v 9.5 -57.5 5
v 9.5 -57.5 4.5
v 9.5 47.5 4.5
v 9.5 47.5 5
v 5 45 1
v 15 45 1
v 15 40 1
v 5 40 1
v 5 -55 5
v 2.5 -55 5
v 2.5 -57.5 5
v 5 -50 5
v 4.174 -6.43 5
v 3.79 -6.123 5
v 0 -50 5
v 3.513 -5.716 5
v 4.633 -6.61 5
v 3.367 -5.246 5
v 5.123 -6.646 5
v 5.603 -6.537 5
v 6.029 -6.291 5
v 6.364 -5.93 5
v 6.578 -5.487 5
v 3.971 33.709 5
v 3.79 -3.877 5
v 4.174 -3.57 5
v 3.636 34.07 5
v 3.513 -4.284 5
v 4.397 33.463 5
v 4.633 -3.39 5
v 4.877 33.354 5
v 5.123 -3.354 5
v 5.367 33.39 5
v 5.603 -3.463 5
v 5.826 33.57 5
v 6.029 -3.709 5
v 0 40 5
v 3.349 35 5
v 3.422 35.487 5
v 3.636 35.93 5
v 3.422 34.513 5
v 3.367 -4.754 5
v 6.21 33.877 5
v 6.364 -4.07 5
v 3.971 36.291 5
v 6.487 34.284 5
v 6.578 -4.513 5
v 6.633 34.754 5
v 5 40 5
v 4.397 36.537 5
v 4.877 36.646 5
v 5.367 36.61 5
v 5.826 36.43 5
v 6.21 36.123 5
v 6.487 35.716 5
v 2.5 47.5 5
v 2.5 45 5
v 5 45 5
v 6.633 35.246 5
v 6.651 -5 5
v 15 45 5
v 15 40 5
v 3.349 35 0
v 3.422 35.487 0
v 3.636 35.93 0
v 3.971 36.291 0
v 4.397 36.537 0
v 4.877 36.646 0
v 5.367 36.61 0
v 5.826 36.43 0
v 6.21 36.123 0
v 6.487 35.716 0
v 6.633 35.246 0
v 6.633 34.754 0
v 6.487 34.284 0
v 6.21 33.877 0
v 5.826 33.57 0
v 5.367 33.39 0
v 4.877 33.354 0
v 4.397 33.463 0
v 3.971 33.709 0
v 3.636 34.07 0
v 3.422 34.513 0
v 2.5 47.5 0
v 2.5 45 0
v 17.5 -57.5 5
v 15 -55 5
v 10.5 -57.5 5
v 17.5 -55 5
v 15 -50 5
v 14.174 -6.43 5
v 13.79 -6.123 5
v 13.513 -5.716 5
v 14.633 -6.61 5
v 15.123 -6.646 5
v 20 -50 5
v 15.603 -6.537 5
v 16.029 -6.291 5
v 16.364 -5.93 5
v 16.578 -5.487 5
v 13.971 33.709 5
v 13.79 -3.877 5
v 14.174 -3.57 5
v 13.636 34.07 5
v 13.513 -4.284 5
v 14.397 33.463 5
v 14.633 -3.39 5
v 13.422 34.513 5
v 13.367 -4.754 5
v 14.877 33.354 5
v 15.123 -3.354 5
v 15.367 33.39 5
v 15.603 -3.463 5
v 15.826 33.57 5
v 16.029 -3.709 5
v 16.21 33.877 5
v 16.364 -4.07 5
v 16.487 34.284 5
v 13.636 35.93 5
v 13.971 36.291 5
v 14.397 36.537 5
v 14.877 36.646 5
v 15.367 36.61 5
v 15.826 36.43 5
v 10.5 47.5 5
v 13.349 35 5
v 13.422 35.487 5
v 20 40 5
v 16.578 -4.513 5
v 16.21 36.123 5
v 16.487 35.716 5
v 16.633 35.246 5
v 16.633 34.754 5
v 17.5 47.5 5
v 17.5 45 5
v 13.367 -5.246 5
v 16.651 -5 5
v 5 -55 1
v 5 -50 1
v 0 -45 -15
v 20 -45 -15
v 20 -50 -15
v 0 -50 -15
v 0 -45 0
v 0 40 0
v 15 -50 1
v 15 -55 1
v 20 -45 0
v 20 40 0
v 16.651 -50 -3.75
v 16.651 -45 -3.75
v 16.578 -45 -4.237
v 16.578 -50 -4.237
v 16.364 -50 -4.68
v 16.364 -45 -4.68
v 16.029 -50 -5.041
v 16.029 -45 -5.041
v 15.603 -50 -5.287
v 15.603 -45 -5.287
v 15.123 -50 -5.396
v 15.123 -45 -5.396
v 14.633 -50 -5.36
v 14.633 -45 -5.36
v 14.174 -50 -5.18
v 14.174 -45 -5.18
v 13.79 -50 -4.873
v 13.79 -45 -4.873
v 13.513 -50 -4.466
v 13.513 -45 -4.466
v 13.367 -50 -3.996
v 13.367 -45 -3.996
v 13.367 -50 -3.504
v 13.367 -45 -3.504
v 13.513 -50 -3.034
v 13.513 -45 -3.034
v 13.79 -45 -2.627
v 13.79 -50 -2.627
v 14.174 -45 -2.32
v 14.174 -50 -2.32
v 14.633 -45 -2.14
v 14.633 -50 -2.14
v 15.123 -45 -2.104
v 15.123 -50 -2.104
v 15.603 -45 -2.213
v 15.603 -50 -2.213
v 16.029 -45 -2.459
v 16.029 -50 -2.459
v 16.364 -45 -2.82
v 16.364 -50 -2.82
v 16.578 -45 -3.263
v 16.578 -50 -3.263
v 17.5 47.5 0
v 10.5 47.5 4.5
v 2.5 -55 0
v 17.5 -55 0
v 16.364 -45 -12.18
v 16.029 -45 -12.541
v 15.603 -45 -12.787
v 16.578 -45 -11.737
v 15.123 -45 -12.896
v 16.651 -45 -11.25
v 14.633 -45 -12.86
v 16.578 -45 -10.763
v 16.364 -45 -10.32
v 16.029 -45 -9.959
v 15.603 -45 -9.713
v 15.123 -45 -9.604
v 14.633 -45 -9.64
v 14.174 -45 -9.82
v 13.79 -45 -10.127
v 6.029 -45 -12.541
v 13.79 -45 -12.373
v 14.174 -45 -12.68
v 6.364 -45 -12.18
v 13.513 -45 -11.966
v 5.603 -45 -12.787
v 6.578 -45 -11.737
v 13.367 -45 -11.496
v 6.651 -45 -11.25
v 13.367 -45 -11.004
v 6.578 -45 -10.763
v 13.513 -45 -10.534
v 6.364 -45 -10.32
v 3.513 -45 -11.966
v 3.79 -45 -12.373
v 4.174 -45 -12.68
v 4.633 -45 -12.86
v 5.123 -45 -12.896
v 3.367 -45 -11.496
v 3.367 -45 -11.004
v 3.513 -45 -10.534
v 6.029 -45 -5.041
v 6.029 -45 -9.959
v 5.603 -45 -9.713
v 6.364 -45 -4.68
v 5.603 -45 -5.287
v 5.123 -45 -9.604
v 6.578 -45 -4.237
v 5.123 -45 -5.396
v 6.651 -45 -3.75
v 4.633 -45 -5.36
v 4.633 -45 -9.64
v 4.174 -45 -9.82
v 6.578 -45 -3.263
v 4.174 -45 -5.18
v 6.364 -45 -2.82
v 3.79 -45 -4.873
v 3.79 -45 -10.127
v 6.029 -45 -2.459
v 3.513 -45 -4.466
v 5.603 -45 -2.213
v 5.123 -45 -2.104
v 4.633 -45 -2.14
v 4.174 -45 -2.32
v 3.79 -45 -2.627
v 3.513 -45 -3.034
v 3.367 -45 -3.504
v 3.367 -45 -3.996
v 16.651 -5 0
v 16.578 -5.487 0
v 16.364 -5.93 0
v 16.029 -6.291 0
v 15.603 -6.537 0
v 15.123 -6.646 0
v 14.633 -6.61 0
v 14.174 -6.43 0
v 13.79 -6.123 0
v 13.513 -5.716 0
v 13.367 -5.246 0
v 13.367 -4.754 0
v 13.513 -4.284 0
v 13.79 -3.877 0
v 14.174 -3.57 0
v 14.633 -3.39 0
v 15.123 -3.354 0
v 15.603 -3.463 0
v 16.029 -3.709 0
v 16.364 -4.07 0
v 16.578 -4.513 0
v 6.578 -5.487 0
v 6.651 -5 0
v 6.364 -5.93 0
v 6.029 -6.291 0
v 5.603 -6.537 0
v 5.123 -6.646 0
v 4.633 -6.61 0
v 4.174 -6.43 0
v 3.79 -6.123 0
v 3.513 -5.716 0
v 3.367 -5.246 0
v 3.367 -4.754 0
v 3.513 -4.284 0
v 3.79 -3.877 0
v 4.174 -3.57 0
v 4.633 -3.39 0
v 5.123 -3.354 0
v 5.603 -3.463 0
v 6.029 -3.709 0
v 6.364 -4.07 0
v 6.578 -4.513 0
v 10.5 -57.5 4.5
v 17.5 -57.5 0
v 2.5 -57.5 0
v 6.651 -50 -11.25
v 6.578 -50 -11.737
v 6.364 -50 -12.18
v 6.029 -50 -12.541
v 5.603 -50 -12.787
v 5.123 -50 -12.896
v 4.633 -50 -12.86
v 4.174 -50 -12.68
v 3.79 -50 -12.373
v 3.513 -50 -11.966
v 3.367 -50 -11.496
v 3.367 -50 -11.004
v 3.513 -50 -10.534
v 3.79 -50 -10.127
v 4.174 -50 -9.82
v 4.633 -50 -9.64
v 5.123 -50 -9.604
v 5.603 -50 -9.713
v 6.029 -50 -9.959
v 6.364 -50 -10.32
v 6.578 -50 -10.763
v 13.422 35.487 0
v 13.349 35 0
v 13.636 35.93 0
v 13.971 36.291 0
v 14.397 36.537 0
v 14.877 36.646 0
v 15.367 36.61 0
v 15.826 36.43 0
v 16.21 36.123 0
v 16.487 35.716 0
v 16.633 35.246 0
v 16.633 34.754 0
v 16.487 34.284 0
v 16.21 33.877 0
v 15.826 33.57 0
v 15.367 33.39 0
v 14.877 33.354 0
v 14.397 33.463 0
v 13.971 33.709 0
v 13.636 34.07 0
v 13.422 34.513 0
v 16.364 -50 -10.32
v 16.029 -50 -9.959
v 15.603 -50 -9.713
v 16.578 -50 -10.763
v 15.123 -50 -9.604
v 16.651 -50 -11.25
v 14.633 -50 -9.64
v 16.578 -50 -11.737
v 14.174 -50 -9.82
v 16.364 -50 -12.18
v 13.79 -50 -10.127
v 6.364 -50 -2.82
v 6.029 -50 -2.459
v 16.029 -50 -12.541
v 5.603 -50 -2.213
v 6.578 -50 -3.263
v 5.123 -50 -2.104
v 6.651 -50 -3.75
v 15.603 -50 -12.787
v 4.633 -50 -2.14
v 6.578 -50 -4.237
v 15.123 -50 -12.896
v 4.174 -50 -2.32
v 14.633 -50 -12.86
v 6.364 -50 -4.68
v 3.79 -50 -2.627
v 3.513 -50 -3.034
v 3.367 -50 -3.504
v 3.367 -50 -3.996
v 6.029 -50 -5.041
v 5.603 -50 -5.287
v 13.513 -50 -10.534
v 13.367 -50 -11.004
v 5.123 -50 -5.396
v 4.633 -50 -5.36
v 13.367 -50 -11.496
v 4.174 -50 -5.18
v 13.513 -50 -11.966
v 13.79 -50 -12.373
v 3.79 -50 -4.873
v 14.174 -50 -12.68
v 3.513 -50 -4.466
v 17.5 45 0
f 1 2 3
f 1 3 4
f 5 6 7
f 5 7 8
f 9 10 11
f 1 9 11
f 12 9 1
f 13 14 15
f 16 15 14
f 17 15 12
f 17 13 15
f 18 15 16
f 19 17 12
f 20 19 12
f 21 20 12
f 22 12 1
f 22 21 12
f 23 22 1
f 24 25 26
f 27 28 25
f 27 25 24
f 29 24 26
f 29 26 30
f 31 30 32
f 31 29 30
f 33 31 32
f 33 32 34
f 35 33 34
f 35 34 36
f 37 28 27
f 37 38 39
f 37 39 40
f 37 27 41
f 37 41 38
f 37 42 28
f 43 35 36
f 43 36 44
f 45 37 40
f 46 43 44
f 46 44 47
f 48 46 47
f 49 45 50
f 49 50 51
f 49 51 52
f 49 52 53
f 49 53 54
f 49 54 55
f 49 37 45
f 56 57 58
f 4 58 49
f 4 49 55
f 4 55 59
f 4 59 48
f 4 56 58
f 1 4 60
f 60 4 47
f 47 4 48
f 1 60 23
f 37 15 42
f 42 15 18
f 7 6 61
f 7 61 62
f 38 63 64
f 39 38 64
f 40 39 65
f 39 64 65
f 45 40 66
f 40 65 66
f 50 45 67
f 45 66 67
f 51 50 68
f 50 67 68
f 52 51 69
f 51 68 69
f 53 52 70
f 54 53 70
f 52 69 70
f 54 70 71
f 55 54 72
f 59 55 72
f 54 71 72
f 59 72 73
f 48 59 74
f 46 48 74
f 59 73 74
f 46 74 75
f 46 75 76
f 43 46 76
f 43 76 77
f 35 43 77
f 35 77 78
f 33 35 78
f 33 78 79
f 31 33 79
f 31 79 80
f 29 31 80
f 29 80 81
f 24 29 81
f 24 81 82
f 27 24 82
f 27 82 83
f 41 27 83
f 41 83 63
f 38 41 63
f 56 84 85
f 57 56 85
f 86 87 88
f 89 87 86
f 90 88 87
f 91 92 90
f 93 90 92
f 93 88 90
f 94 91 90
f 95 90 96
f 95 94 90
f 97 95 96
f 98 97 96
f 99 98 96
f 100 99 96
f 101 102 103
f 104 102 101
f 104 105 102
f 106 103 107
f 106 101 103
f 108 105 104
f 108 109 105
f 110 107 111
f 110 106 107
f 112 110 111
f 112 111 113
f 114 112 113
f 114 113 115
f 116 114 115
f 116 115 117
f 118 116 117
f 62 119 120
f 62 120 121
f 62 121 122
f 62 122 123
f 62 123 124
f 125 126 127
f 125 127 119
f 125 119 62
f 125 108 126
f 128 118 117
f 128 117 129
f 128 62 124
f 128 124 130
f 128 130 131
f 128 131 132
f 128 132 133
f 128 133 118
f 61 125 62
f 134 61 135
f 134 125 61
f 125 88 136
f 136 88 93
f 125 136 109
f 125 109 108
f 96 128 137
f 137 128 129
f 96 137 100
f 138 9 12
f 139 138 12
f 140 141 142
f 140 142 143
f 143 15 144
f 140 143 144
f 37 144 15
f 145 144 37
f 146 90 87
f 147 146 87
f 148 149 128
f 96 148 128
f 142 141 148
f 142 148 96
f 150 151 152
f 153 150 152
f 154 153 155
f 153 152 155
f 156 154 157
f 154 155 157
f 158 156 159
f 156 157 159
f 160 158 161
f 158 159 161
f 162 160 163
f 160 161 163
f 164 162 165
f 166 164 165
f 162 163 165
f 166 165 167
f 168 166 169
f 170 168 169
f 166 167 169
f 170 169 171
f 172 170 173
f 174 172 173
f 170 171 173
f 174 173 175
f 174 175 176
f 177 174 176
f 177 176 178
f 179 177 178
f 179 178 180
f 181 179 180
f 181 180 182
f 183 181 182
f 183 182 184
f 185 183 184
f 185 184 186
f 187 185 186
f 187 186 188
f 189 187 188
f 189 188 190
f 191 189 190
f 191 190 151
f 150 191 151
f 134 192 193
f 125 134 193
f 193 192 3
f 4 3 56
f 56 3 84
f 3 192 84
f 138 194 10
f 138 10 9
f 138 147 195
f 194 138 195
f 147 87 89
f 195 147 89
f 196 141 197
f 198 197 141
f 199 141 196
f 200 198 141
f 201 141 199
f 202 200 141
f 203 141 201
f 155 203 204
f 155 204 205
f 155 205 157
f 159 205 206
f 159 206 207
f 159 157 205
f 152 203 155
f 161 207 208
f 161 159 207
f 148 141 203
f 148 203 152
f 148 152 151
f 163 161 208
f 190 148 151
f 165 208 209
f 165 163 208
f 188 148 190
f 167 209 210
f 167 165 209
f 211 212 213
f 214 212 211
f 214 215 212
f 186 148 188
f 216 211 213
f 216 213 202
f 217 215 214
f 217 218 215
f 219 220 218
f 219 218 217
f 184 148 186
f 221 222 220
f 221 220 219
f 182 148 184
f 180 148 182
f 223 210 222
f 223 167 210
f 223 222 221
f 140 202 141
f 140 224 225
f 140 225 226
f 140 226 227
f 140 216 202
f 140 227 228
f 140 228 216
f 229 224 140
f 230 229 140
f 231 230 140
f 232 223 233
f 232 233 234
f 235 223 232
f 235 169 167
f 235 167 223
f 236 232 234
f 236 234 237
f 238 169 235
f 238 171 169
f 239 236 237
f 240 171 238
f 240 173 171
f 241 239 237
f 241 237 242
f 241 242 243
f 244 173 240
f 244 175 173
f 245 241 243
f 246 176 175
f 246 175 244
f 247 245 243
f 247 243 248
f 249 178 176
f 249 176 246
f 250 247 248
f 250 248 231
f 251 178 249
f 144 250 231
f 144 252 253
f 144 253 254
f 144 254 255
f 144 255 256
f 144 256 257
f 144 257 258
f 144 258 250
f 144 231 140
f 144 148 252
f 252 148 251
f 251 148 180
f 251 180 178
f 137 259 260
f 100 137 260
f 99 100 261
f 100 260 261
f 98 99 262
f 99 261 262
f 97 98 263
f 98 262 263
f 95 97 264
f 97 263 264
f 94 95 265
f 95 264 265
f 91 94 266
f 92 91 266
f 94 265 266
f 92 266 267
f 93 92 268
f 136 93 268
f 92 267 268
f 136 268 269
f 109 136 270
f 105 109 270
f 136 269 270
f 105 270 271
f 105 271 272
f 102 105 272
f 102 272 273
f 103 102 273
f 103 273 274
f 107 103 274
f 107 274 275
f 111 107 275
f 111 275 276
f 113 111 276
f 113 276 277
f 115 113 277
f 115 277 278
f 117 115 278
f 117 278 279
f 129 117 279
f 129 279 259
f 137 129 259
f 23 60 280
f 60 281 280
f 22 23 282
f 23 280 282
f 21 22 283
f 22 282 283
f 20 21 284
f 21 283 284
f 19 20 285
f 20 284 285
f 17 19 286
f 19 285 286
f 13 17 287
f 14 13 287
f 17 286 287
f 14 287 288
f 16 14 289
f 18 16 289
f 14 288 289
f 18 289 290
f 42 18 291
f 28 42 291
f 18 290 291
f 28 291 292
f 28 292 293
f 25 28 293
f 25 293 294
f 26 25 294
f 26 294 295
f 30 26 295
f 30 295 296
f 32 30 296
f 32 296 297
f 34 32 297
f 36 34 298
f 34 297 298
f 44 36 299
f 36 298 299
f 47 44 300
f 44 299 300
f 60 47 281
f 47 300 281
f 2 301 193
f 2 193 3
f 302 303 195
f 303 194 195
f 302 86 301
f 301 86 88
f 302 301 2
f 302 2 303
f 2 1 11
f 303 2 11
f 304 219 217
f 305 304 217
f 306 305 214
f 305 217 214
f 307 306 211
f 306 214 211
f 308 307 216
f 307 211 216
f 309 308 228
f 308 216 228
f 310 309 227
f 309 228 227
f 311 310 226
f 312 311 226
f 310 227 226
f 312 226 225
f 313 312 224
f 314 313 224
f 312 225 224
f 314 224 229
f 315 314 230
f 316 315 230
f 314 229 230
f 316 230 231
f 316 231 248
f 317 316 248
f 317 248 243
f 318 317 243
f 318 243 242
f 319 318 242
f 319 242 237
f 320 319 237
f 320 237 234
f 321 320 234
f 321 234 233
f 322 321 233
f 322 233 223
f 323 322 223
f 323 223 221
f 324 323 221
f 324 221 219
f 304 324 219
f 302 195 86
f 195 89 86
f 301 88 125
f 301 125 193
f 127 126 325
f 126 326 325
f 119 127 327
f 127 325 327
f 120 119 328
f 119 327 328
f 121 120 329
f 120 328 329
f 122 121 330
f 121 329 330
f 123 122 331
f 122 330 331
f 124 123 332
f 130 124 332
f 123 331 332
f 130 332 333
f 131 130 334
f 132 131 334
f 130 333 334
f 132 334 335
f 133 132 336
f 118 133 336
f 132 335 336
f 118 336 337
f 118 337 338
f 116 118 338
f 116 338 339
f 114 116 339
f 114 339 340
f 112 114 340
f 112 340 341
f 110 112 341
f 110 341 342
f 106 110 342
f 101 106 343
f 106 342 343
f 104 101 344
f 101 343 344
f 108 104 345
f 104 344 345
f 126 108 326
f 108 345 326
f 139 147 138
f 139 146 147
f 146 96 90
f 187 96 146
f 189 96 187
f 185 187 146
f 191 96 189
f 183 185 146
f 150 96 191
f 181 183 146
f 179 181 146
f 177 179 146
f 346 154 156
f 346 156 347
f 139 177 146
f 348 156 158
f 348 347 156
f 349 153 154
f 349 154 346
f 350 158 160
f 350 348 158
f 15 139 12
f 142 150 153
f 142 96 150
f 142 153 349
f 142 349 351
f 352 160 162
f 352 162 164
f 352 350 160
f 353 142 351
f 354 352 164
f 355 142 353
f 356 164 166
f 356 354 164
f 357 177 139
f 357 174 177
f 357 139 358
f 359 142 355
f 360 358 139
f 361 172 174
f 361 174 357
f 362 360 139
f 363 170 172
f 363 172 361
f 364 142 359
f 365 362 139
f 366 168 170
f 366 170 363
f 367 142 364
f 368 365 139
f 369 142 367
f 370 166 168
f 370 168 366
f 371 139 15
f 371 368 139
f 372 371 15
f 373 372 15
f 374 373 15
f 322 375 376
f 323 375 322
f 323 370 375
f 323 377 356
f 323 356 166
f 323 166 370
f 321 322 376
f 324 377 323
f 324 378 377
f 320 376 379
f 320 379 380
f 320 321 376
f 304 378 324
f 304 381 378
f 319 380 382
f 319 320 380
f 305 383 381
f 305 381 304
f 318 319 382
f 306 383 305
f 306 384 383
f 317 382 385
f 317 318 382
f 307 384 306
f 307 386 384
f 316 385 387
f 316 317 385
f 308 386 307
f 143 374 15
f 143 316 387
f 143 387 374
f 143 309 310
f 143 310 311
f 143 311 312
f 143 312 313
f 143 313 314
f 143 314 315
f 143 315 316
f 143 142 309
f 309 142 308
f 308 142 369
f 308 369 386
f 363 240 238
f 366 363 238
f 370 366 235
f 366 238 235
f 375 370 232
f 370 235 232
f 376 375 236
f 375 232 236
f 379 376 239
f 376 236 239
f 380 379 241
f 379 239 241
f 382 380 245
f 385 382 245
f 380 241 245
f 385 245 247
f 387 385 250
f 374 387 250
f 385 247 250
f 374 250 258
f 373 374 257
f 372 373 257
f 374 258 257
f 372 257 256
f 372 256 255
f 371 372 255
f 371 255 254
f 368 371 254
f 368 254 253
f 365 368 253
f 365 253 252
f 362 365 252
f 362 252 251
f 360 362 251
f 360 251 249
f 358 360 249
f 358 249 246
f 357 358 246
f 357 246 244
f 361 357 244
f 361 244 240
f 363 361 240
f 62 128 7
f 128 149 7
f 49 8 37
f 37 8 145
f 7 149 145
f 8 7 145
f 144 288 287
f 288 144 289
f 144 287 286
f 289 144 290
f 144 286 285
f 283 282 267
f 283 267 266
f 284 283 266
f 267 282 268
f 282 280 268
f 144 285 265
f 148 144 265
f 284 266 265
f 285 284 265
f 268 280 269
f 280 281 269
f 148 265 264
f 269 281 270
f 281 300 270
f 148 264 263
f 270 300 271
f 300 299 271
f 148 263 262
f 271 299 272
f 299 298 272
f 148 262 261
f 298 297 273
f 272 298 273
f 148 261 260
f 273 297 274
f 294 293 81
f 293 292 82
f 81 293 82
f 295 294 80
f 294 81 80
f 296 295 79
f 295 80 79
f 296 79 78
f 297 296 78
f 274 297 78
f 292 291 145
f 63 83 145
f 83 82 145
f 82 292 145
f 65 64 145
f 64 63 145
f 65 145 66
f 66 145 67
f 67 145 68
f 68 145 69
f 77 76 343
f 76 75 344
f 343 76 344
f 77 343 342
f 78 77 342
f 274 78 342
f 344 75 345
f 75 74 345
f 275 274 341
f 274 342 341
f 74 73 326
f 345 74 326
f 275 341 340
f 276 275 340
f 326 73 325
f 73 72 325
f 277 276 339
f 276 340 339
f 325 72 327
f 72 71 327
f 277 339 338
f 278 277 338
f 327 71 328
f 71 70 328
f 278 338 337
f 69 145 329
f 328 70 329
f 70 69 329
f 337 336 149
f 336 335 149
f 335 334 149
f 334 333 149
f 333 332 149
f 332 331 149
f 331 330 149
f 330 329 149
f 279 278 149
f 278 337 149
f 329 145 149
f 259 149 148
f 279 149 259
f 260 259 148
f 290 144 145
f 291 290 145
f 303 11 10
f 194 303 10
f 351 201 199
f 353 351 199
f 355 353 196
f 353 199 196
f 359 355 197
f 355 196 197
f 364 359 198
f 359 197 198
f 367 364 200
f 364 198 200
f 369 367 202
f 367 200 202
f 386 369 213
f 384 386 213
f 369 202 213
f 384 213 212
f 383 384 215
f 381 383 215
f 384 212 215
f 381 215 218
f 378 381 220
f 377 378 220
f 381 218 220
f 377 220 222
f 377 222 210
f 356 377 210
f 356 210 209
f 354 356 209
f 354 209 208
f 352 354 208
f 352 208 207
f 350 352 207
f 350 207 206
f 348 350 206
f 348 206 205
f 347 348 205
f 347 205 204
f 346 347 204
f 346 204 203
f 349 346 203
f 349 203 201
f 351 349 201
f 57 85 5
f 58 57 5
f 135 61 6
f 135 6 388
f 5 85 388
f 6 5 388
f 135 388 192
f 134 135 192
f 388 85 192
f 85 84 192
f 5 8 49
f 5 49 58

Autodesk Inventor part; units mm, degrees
ref_plane "YZ Plane" through (0, 0, 0) normal (1, 0, 0) x (0, 1, 0)
ref_plane "XZ Plane" through (0, 0, 0) normal (0, 1, 0) x (-1, 0, 0)
ref_plane "XY Plane" through (0, 0, 0) normal (0, 0, 1) x (1, 0, 0)
sketch "Sketch1" plane through (0, 0, 0) normal (0, 0, 1) x (1, 0, 0)
  line L0 (0, 0) -> (20, 0)
  line L1 (20, 0) -> (20, -2.7984)
  line L2 (0, -2.7984) -> (0, 0)
  line L3 (0, 0) -> (20, 0)
  line L4 (20, 0) -> (20, -50)
  line L5 (20, -50) -> (0, -50)
  line L6 (0, -50) -> (0, 0)
  line L7 (0, 0) -> (5, 0)
  line L8 (0, -5) -> (0, 0)
  circle A0 centre (5, -5) radius 1.651
  line L9 (20, 0) -> (15, 0)
  line L10 (15, -5) -> (20, -5)
  line L11 (20, -5) -> (20, 0)
  circle A1 centre (15, -5) radius 1.651
  dimension "d1" = 20
  dimension "d2" = 50
  dimension "d6" = 5
  dimension "d7" = 5
  dimension "d9" = 3.302
extrude "Extrusion1" add sketch "Sketch1" along normal blind 5
sketch "Sketch2" plane through (0, 0, 5) normal (0, 0, 1) x (1, 0, 0)
  line L0 (20, 0) -> (0, 0) projected
  line L1 (10, 0) -> (5, 0)
  line L2 (5, 0) -> (5, 5)
  line L3 (5, 5) -> (10, 5)
  line L4 (10, 5) -> (10, 0)
  line L5 (10, 5) -> (2.5, 5)
  line L6 (2.5, 5) -> (2.5, 7.5)
  line L7 (2.5, 7.5) -> (10, 7.5)
  line L8 (10, 7.5) -> (10, 5)
  line L9 (2.5, 7.5) -> (17.5, 7.5)
  line L10 (17.5, 7.5) -> (17.5, 5)
  line L11 (17.5, 5) -> (2.5, 5)
  line L12 (2.5, 5) -> (2.5, 7.5)
  line L13 (10, 5) -> (15, 5)
  line L14 (15, 5) -> (15, 0)
  line L15 (15, 0) -> (10, 0)
  line L16 (10, 0) -> (10, 5)
  dimension "d12" = 5
  dimension "d13" = 5
  dimension "d14" = 7.5
  dimension "d15" = 2.5
  dimension "d16" = 15
  dimension "d17" = 2.5
  dimension "d18" = 5
  dimension "d19" = 5
extrude "Extrusion2" add sketch "Sketch2" against normal blind 5
sketch "Sketch3" plane through (0, 0, 0) normal (0, 0, -1) x (-1, 0, 0)
  line L0 (-5, 0) -> (-5, 5) projected
  line L1 (-5, 0) -> (-15, 0)
  line L2 (-15, 0) -> (-15, 5)
  line L3 (-15, 5) -> (-5, 5)
  line L4 (-5, 5) -> (-5, 0)
  point P0 (0, 0)
extrude "Extrusion3" cut sketch "Sketch3" against normal blind 1
sketch "Sketch4" plane through (0, 0, 0) normal (0, 0, -1) x (-1, 0, 0)
  line L0 (-5, 0) -> (0, 0) projected
  line L1 (-20, -50) -> (0, -50) projected
  line L2 (0, 0) -> (-20, 0)
  line L3 (-20, 0) -> (-20, -50)
  line L4 (-20, -50) -> (0, -50)
  line L5 (0, -50) -> (0, 0)
  line L6 (0, -50) -> (-5, -50)
  line L7 (-5, -50) -> (-5, -30)
  line L8 (-5, -30) -> (0, -30)
  line L9 (0, -30) -> (0, -50)
  line L10 (0, -50) -> (0, 0) projected
  line L11 (0, -50) -> (-5, -50)
  line L12 (-5, -50) -> (-5, -30)
  line L13 (-5, -30) -> (0, -30)
  line L14 (0, -30) -> (0, -50)
  line L15 (0, -50) -> (-20, -50)
  line L16 (-20, -50) -> (-20, -45)
  line L17 (-20, -45) -> (0, -45)
  line L18 (0, -45) -> (0, -50)
  dimension "d28" = 5
  dimension "d29" = 20
  dimension "d30" = 5
  dimension "d31" = 20
  dimension "d32" = 20
  dimension "d33" = 5
extrude "Extrusion4" add sketch "Sketch4" along normal blind 15 contours L17 L7 L1 L3 | L5 L1 L7 L17
sketch "Sketch5" plane through (0, 0, 5) normal (0, 0, 1) x (1, 0, 0)
  line L0 (20, -50) -> (20, 0) projected
  line L1 (20, 0) -> (0, 0)
  line L2 (0, 0) -> (0, -50)
  line L3 (0, -50) -> (20, -50)
  line L4 (20, -50) -> (20, 0)
  line L5 (10, -50) -> (15, -50)
  line L6 (15, -50) -> (15, -55)
  line L7 (15, -55) -> (10, -55)
  line L8 (10, -55) -> (10, -50)
  line L9 (15, -55) -> (5, -55)
  line L10 (5, -55) -> (5, -50)
  line L11 (5, -50) -> (15, -50)
  line L12 (15, -50) -> (15, -55)
  line L13 (10, -55) -> (17.5, -55)
  line L14 (17.5, -55) -> (17.5, -57.5)
  line L15 (17.5, -57.5) -> (10, -57.5)
  line L16 (10, -57.5) -> (10, -55)
  line L17 (17.5, -57.5) -> (2.5, -57.5)
  line L18 (2.5, -57.5) -> (2.5, -55)
  line L19 (2.5, -55) -> (17.5, -55)
  line L20 (17.5, -55) -> (17.5, -57.5)
  dimension "d36" = 5
  dimension "d37" = 5
  dimension "d38" = 10
  dimension "d39" = 5
  dimension "d40" = 7.5
  dimension "d41" = 2.5
  dimension "d42" = 15
  dimension "d43" = 2.5
extrude "Extrusion5" add sketch "Sketch5" against normal blind 5 contours L6 L7 L8 L3 | L8 L9 L10 L3 | L13 L14 L15 L16 L7 | L16 L17 L18 L19 L9
sketch "Sketch6" plane through (0, 0, 0) normal (0, 0, -1) x (-1, 0, 0)
  line L0 (-5, -55) -> (-5, -50) projected
  line L1 (-15, -50) -> (-5, -50) projected
  line L2 (-5, -55) -> (-15, -55)
  line L3 (-15, -55) -> (-15, -50)
  line L4 (-15, -50) -> (-5, -50)
  line L5 (-5, -50) -> (-5, -55)
  point P0 (0, 0)
extrude "Extrusion6" cut sketch "Sketch6" against normal blind 1
sketch "Sketch8" plane through (0, -45, 0) normal (0, 1, 0) x (1, 0, 0)
  line L0 (0, 15) -> (20, 15) projected
  line L1 (0, 15) -> (20, 15)
  line L2 (20, 15) -> (20, 0)
  line L3 (20, 0) -> (0, 0)
  line L4 (0, 0) -> (0, 15)
  line L5 (0, 0) -> (0, 15) projected
  line L6 (0, 7.5) -> (20, 7.5)
  line L7 (20, 0) -> (20, 15) projected
  line L8 (20, 0) -> (0, 15)
  line L9 (20, 15) -> (0, 0)
  line L10 (10, 7.5) -> (10, 15)
  line L11 (10, 7.5) -> (10, 0)
  line L12 (10, 7.5) -> (0, 0)
  line L13 (10, 7.5) -> (20, 0)
  line L14 (10, 7.5) -> (0, 15)
  line L15 (10, 7.5) -> (20, 15)
  circle A0 centre (5, 3.75) radius 1.651
  circle A1 centre (15, 3.75) radius 1.651
  circle A2 centre (15, 11.25) radius 1.651
  circle A3 centre (5, 11.25) radius 1.651
  dimension "d48" = 3.302
  dimension "d49" = 3.302
  dimension "d50" = 3.302
  dimension "d51" = 3.302
extrude "Extrusion7" cut sketch "Sketch8" against normal blind 5 contours A3 L8 | L8 A3 | A2 L9 | L9 A2 | A1 L8 | L8 A1 | A0 L9 | L9 A0
sketch "Sketch9" plane through (0, 0, 0) normal (0, 0, -1) x (-1, 0, 0)
  circle A0 centre (-15, -5) radius 1.651 projected
  line L0 (-15, -3.349) -> (-15, 35)
  line L1 (-16.651, -5) -> (-20, -5)
  line L2 (-20, -5) -> (-20, 40)
  line L3 (-20, 40) -> (-15, 40)
  line L4 (-15, 40) -> (-15, -3.349)
  line L5 (0, -45) -> (0, 0) projected
  line L6 (-20, 40) -> (0, 40)
  line L7 (0, 40) -> (0, -5)
  line L8 (-20, -5) -> (-20, 40)
  line L9 (-15, 35) -> (0, 35)
  line L10 (0, 35) -> (0, 40)
  line L11 (0, 40) -> (-15, 40)
  line L12 (-15, 40) -> (-15, 35)
  circle A1 centre (-5, -5) radius 1.651 projected
  line L13 (-5, -5) -> (0, -5)
  line L14 (0, -5) -> (0, 35)
  line L15 (0, 35) -> (-5, 35)
  line L16 (-5, 35) -> (-5, -3.349)
  circle A2 centre (-15, 35) radius 1.651
  circle A3 centre (-5, 35) radius 1.651
  line L17 (-15, 40) -> (-5, 40)
  line L18 (-5, 40) -> (-5, 45)
  line L19 (-5, 45) -> (-15, 45)
  line L20 (-15, 45) -> (-15, 40)
  line L21 (-15, 45) -> (-17.5, 45)
  line L22 (-17.5, 45) -> (-17.5, 47.5)
  line L23 (-17.5, 47.5) -> (-15, 47.5)
  line L24 (-15, 47.5) -> (-15, 45)
  line L25 (-17.5, 47.5) -> (0, 47.5)
  line L26 (0, 47.5) -> (0, 45)
  line L27 (0, 45) -> (-17.5, 45)
  line L28 (-17.5, 45) -> (-17.5, 47.5)
  line L29 (-17.5, 47.5) -> (-2.5, 47.5)
  line L30 (-2.5, 47.5) -> (-2.5, 45)
  line L31 (-2.5, 45) -> (-17.5, 45)
  line L32 (-17.5, 45) -> (-17.5, 47.5)
  arc A4 (-13.349, -5) -> (-16.651, -5) centre (-15, -5) ccw
  arc A5 (-3.349, -5) -> (-6.651, -5) centre (-5, -5) ccw
  arc A6 (-13.349, -5) -> (-16.651, -5) centre (-15, -5) ccw
  arc A7 (-3.349, -5) -> (-6.651, -5) centre (-5, -5) ccw
  line L33 (0, -5) -> (-3.349, -5)
  line L34 (-6.651, -5) -> (-13.349, -5)
  line L35 (-16.651, -5) -> (-20, -5)
  dimension "d54" = 40
  dimension "d55" = 45
  dimension "d56" = 3.302
  dimension "d57" = 3.302
  dimension "d58" = 10
  dimension "d59" = 5
  dimension "d60" = 2.5
  dimension "d61" = 2.5
  dimension "d62" = 17.5
  dimension "d63" = 2.5
  dimension "d64" = 15
  dimension "d65" = 2.5
extrude "Extrusion8" add sketch "Sketch9" against normal blind 5 contours A0 L0 A2 L9 A3 L16 A1 L34 | A0 L1 L2 L3 L4 A2 L0 | A2 L4 L0 | L0 L9 A2 | L16 A3 L9 L7 L5 L13 A1 | L4 A2 L9 | L4 L6 L7 L9 A3 A2 | A3 L9 L16 | L16 L9 A3 | L20 L19 L18 L6 | A3 L9 | L24 L25 L30 L27 L19 | L21 L22 L23 L24
sketch "Sketch10" plane through (0, 0, 0) normal (0, 0, -1) x (-1, 0, 0)
  circle A0 centre (-15, -5) radius 1.651 projected
  line L0 (-15, -5) -> (-15, 35)
  line L1 (-15, -5) -> (25, -5) construction
  line L2 (-15, 35) -> (-5, 35)
  circle A1 centre (-15, 35) radius 1.651
  circle A2 centre (-5, 35) radius 1.651
  point P0 (0, 0)
  dimension "d68" = 40
  dimension "d69" = 90
  dimension "d70" = 10
  dimension "d71" = 3.302
  dimension "d72" = 3.302
extrude "Extrusion9" cut sketch "Sketch10" against normal blind 5 contours A2 | A1 L2 L0 | L0 L2 A1
sketch "Sketch11" plane through (0, 0, 0) normal (0, 0, -1) x (-1, 0, 0)
  line L0 (-15, 45) -> (-17.5, 45) projected
  line L1 (-5, 40) -> (0, 40) projected
  line L2 (-15, 45) -> (-5, 45)
  line L3 (-5, 45) -> (-5, 40)
  line L4 (-5, 40) -> (-15, 40)
  line L5 (-15, 40) -> (-15, 45)
  point P0 (0, 0)
extrude "Extrusion10" cut sketch "Sketch11" against normal blind 1
sketch "Sketch13" plane through (2.5, -57.5, 5) normal (0, -1, 0) x (1, 0, 0)
  line L0 (0, 0) -> (15, 0) projected
  line L1 (7.5, 0) -> (8, 0)
  line L2 (8, 0) -> (8, -0.5)
  line L3 (8, -0.5) -> (7.5, -0.5)
  line L4 (7.5, -0.5) -> (7.5, 0)
  line L5 (8, -0.5) -> (7, -0.5)
  line L6 (7, -0.5) -> (7, 0)
  line L7 (7, 0) -> (8, 0)
  line L8 (8, 0) -> (8, -0.5)
  point P0 (-2.5, -5)
  dimension "d77" = 0.5
  dimension "d78" = 0.5
  dimension "d79" = 1
  dimension "d80" = 0.5
extrude "Extrusion11" cut sketch "Sketch13" against normal blind 500
properties part number "Attachment"
